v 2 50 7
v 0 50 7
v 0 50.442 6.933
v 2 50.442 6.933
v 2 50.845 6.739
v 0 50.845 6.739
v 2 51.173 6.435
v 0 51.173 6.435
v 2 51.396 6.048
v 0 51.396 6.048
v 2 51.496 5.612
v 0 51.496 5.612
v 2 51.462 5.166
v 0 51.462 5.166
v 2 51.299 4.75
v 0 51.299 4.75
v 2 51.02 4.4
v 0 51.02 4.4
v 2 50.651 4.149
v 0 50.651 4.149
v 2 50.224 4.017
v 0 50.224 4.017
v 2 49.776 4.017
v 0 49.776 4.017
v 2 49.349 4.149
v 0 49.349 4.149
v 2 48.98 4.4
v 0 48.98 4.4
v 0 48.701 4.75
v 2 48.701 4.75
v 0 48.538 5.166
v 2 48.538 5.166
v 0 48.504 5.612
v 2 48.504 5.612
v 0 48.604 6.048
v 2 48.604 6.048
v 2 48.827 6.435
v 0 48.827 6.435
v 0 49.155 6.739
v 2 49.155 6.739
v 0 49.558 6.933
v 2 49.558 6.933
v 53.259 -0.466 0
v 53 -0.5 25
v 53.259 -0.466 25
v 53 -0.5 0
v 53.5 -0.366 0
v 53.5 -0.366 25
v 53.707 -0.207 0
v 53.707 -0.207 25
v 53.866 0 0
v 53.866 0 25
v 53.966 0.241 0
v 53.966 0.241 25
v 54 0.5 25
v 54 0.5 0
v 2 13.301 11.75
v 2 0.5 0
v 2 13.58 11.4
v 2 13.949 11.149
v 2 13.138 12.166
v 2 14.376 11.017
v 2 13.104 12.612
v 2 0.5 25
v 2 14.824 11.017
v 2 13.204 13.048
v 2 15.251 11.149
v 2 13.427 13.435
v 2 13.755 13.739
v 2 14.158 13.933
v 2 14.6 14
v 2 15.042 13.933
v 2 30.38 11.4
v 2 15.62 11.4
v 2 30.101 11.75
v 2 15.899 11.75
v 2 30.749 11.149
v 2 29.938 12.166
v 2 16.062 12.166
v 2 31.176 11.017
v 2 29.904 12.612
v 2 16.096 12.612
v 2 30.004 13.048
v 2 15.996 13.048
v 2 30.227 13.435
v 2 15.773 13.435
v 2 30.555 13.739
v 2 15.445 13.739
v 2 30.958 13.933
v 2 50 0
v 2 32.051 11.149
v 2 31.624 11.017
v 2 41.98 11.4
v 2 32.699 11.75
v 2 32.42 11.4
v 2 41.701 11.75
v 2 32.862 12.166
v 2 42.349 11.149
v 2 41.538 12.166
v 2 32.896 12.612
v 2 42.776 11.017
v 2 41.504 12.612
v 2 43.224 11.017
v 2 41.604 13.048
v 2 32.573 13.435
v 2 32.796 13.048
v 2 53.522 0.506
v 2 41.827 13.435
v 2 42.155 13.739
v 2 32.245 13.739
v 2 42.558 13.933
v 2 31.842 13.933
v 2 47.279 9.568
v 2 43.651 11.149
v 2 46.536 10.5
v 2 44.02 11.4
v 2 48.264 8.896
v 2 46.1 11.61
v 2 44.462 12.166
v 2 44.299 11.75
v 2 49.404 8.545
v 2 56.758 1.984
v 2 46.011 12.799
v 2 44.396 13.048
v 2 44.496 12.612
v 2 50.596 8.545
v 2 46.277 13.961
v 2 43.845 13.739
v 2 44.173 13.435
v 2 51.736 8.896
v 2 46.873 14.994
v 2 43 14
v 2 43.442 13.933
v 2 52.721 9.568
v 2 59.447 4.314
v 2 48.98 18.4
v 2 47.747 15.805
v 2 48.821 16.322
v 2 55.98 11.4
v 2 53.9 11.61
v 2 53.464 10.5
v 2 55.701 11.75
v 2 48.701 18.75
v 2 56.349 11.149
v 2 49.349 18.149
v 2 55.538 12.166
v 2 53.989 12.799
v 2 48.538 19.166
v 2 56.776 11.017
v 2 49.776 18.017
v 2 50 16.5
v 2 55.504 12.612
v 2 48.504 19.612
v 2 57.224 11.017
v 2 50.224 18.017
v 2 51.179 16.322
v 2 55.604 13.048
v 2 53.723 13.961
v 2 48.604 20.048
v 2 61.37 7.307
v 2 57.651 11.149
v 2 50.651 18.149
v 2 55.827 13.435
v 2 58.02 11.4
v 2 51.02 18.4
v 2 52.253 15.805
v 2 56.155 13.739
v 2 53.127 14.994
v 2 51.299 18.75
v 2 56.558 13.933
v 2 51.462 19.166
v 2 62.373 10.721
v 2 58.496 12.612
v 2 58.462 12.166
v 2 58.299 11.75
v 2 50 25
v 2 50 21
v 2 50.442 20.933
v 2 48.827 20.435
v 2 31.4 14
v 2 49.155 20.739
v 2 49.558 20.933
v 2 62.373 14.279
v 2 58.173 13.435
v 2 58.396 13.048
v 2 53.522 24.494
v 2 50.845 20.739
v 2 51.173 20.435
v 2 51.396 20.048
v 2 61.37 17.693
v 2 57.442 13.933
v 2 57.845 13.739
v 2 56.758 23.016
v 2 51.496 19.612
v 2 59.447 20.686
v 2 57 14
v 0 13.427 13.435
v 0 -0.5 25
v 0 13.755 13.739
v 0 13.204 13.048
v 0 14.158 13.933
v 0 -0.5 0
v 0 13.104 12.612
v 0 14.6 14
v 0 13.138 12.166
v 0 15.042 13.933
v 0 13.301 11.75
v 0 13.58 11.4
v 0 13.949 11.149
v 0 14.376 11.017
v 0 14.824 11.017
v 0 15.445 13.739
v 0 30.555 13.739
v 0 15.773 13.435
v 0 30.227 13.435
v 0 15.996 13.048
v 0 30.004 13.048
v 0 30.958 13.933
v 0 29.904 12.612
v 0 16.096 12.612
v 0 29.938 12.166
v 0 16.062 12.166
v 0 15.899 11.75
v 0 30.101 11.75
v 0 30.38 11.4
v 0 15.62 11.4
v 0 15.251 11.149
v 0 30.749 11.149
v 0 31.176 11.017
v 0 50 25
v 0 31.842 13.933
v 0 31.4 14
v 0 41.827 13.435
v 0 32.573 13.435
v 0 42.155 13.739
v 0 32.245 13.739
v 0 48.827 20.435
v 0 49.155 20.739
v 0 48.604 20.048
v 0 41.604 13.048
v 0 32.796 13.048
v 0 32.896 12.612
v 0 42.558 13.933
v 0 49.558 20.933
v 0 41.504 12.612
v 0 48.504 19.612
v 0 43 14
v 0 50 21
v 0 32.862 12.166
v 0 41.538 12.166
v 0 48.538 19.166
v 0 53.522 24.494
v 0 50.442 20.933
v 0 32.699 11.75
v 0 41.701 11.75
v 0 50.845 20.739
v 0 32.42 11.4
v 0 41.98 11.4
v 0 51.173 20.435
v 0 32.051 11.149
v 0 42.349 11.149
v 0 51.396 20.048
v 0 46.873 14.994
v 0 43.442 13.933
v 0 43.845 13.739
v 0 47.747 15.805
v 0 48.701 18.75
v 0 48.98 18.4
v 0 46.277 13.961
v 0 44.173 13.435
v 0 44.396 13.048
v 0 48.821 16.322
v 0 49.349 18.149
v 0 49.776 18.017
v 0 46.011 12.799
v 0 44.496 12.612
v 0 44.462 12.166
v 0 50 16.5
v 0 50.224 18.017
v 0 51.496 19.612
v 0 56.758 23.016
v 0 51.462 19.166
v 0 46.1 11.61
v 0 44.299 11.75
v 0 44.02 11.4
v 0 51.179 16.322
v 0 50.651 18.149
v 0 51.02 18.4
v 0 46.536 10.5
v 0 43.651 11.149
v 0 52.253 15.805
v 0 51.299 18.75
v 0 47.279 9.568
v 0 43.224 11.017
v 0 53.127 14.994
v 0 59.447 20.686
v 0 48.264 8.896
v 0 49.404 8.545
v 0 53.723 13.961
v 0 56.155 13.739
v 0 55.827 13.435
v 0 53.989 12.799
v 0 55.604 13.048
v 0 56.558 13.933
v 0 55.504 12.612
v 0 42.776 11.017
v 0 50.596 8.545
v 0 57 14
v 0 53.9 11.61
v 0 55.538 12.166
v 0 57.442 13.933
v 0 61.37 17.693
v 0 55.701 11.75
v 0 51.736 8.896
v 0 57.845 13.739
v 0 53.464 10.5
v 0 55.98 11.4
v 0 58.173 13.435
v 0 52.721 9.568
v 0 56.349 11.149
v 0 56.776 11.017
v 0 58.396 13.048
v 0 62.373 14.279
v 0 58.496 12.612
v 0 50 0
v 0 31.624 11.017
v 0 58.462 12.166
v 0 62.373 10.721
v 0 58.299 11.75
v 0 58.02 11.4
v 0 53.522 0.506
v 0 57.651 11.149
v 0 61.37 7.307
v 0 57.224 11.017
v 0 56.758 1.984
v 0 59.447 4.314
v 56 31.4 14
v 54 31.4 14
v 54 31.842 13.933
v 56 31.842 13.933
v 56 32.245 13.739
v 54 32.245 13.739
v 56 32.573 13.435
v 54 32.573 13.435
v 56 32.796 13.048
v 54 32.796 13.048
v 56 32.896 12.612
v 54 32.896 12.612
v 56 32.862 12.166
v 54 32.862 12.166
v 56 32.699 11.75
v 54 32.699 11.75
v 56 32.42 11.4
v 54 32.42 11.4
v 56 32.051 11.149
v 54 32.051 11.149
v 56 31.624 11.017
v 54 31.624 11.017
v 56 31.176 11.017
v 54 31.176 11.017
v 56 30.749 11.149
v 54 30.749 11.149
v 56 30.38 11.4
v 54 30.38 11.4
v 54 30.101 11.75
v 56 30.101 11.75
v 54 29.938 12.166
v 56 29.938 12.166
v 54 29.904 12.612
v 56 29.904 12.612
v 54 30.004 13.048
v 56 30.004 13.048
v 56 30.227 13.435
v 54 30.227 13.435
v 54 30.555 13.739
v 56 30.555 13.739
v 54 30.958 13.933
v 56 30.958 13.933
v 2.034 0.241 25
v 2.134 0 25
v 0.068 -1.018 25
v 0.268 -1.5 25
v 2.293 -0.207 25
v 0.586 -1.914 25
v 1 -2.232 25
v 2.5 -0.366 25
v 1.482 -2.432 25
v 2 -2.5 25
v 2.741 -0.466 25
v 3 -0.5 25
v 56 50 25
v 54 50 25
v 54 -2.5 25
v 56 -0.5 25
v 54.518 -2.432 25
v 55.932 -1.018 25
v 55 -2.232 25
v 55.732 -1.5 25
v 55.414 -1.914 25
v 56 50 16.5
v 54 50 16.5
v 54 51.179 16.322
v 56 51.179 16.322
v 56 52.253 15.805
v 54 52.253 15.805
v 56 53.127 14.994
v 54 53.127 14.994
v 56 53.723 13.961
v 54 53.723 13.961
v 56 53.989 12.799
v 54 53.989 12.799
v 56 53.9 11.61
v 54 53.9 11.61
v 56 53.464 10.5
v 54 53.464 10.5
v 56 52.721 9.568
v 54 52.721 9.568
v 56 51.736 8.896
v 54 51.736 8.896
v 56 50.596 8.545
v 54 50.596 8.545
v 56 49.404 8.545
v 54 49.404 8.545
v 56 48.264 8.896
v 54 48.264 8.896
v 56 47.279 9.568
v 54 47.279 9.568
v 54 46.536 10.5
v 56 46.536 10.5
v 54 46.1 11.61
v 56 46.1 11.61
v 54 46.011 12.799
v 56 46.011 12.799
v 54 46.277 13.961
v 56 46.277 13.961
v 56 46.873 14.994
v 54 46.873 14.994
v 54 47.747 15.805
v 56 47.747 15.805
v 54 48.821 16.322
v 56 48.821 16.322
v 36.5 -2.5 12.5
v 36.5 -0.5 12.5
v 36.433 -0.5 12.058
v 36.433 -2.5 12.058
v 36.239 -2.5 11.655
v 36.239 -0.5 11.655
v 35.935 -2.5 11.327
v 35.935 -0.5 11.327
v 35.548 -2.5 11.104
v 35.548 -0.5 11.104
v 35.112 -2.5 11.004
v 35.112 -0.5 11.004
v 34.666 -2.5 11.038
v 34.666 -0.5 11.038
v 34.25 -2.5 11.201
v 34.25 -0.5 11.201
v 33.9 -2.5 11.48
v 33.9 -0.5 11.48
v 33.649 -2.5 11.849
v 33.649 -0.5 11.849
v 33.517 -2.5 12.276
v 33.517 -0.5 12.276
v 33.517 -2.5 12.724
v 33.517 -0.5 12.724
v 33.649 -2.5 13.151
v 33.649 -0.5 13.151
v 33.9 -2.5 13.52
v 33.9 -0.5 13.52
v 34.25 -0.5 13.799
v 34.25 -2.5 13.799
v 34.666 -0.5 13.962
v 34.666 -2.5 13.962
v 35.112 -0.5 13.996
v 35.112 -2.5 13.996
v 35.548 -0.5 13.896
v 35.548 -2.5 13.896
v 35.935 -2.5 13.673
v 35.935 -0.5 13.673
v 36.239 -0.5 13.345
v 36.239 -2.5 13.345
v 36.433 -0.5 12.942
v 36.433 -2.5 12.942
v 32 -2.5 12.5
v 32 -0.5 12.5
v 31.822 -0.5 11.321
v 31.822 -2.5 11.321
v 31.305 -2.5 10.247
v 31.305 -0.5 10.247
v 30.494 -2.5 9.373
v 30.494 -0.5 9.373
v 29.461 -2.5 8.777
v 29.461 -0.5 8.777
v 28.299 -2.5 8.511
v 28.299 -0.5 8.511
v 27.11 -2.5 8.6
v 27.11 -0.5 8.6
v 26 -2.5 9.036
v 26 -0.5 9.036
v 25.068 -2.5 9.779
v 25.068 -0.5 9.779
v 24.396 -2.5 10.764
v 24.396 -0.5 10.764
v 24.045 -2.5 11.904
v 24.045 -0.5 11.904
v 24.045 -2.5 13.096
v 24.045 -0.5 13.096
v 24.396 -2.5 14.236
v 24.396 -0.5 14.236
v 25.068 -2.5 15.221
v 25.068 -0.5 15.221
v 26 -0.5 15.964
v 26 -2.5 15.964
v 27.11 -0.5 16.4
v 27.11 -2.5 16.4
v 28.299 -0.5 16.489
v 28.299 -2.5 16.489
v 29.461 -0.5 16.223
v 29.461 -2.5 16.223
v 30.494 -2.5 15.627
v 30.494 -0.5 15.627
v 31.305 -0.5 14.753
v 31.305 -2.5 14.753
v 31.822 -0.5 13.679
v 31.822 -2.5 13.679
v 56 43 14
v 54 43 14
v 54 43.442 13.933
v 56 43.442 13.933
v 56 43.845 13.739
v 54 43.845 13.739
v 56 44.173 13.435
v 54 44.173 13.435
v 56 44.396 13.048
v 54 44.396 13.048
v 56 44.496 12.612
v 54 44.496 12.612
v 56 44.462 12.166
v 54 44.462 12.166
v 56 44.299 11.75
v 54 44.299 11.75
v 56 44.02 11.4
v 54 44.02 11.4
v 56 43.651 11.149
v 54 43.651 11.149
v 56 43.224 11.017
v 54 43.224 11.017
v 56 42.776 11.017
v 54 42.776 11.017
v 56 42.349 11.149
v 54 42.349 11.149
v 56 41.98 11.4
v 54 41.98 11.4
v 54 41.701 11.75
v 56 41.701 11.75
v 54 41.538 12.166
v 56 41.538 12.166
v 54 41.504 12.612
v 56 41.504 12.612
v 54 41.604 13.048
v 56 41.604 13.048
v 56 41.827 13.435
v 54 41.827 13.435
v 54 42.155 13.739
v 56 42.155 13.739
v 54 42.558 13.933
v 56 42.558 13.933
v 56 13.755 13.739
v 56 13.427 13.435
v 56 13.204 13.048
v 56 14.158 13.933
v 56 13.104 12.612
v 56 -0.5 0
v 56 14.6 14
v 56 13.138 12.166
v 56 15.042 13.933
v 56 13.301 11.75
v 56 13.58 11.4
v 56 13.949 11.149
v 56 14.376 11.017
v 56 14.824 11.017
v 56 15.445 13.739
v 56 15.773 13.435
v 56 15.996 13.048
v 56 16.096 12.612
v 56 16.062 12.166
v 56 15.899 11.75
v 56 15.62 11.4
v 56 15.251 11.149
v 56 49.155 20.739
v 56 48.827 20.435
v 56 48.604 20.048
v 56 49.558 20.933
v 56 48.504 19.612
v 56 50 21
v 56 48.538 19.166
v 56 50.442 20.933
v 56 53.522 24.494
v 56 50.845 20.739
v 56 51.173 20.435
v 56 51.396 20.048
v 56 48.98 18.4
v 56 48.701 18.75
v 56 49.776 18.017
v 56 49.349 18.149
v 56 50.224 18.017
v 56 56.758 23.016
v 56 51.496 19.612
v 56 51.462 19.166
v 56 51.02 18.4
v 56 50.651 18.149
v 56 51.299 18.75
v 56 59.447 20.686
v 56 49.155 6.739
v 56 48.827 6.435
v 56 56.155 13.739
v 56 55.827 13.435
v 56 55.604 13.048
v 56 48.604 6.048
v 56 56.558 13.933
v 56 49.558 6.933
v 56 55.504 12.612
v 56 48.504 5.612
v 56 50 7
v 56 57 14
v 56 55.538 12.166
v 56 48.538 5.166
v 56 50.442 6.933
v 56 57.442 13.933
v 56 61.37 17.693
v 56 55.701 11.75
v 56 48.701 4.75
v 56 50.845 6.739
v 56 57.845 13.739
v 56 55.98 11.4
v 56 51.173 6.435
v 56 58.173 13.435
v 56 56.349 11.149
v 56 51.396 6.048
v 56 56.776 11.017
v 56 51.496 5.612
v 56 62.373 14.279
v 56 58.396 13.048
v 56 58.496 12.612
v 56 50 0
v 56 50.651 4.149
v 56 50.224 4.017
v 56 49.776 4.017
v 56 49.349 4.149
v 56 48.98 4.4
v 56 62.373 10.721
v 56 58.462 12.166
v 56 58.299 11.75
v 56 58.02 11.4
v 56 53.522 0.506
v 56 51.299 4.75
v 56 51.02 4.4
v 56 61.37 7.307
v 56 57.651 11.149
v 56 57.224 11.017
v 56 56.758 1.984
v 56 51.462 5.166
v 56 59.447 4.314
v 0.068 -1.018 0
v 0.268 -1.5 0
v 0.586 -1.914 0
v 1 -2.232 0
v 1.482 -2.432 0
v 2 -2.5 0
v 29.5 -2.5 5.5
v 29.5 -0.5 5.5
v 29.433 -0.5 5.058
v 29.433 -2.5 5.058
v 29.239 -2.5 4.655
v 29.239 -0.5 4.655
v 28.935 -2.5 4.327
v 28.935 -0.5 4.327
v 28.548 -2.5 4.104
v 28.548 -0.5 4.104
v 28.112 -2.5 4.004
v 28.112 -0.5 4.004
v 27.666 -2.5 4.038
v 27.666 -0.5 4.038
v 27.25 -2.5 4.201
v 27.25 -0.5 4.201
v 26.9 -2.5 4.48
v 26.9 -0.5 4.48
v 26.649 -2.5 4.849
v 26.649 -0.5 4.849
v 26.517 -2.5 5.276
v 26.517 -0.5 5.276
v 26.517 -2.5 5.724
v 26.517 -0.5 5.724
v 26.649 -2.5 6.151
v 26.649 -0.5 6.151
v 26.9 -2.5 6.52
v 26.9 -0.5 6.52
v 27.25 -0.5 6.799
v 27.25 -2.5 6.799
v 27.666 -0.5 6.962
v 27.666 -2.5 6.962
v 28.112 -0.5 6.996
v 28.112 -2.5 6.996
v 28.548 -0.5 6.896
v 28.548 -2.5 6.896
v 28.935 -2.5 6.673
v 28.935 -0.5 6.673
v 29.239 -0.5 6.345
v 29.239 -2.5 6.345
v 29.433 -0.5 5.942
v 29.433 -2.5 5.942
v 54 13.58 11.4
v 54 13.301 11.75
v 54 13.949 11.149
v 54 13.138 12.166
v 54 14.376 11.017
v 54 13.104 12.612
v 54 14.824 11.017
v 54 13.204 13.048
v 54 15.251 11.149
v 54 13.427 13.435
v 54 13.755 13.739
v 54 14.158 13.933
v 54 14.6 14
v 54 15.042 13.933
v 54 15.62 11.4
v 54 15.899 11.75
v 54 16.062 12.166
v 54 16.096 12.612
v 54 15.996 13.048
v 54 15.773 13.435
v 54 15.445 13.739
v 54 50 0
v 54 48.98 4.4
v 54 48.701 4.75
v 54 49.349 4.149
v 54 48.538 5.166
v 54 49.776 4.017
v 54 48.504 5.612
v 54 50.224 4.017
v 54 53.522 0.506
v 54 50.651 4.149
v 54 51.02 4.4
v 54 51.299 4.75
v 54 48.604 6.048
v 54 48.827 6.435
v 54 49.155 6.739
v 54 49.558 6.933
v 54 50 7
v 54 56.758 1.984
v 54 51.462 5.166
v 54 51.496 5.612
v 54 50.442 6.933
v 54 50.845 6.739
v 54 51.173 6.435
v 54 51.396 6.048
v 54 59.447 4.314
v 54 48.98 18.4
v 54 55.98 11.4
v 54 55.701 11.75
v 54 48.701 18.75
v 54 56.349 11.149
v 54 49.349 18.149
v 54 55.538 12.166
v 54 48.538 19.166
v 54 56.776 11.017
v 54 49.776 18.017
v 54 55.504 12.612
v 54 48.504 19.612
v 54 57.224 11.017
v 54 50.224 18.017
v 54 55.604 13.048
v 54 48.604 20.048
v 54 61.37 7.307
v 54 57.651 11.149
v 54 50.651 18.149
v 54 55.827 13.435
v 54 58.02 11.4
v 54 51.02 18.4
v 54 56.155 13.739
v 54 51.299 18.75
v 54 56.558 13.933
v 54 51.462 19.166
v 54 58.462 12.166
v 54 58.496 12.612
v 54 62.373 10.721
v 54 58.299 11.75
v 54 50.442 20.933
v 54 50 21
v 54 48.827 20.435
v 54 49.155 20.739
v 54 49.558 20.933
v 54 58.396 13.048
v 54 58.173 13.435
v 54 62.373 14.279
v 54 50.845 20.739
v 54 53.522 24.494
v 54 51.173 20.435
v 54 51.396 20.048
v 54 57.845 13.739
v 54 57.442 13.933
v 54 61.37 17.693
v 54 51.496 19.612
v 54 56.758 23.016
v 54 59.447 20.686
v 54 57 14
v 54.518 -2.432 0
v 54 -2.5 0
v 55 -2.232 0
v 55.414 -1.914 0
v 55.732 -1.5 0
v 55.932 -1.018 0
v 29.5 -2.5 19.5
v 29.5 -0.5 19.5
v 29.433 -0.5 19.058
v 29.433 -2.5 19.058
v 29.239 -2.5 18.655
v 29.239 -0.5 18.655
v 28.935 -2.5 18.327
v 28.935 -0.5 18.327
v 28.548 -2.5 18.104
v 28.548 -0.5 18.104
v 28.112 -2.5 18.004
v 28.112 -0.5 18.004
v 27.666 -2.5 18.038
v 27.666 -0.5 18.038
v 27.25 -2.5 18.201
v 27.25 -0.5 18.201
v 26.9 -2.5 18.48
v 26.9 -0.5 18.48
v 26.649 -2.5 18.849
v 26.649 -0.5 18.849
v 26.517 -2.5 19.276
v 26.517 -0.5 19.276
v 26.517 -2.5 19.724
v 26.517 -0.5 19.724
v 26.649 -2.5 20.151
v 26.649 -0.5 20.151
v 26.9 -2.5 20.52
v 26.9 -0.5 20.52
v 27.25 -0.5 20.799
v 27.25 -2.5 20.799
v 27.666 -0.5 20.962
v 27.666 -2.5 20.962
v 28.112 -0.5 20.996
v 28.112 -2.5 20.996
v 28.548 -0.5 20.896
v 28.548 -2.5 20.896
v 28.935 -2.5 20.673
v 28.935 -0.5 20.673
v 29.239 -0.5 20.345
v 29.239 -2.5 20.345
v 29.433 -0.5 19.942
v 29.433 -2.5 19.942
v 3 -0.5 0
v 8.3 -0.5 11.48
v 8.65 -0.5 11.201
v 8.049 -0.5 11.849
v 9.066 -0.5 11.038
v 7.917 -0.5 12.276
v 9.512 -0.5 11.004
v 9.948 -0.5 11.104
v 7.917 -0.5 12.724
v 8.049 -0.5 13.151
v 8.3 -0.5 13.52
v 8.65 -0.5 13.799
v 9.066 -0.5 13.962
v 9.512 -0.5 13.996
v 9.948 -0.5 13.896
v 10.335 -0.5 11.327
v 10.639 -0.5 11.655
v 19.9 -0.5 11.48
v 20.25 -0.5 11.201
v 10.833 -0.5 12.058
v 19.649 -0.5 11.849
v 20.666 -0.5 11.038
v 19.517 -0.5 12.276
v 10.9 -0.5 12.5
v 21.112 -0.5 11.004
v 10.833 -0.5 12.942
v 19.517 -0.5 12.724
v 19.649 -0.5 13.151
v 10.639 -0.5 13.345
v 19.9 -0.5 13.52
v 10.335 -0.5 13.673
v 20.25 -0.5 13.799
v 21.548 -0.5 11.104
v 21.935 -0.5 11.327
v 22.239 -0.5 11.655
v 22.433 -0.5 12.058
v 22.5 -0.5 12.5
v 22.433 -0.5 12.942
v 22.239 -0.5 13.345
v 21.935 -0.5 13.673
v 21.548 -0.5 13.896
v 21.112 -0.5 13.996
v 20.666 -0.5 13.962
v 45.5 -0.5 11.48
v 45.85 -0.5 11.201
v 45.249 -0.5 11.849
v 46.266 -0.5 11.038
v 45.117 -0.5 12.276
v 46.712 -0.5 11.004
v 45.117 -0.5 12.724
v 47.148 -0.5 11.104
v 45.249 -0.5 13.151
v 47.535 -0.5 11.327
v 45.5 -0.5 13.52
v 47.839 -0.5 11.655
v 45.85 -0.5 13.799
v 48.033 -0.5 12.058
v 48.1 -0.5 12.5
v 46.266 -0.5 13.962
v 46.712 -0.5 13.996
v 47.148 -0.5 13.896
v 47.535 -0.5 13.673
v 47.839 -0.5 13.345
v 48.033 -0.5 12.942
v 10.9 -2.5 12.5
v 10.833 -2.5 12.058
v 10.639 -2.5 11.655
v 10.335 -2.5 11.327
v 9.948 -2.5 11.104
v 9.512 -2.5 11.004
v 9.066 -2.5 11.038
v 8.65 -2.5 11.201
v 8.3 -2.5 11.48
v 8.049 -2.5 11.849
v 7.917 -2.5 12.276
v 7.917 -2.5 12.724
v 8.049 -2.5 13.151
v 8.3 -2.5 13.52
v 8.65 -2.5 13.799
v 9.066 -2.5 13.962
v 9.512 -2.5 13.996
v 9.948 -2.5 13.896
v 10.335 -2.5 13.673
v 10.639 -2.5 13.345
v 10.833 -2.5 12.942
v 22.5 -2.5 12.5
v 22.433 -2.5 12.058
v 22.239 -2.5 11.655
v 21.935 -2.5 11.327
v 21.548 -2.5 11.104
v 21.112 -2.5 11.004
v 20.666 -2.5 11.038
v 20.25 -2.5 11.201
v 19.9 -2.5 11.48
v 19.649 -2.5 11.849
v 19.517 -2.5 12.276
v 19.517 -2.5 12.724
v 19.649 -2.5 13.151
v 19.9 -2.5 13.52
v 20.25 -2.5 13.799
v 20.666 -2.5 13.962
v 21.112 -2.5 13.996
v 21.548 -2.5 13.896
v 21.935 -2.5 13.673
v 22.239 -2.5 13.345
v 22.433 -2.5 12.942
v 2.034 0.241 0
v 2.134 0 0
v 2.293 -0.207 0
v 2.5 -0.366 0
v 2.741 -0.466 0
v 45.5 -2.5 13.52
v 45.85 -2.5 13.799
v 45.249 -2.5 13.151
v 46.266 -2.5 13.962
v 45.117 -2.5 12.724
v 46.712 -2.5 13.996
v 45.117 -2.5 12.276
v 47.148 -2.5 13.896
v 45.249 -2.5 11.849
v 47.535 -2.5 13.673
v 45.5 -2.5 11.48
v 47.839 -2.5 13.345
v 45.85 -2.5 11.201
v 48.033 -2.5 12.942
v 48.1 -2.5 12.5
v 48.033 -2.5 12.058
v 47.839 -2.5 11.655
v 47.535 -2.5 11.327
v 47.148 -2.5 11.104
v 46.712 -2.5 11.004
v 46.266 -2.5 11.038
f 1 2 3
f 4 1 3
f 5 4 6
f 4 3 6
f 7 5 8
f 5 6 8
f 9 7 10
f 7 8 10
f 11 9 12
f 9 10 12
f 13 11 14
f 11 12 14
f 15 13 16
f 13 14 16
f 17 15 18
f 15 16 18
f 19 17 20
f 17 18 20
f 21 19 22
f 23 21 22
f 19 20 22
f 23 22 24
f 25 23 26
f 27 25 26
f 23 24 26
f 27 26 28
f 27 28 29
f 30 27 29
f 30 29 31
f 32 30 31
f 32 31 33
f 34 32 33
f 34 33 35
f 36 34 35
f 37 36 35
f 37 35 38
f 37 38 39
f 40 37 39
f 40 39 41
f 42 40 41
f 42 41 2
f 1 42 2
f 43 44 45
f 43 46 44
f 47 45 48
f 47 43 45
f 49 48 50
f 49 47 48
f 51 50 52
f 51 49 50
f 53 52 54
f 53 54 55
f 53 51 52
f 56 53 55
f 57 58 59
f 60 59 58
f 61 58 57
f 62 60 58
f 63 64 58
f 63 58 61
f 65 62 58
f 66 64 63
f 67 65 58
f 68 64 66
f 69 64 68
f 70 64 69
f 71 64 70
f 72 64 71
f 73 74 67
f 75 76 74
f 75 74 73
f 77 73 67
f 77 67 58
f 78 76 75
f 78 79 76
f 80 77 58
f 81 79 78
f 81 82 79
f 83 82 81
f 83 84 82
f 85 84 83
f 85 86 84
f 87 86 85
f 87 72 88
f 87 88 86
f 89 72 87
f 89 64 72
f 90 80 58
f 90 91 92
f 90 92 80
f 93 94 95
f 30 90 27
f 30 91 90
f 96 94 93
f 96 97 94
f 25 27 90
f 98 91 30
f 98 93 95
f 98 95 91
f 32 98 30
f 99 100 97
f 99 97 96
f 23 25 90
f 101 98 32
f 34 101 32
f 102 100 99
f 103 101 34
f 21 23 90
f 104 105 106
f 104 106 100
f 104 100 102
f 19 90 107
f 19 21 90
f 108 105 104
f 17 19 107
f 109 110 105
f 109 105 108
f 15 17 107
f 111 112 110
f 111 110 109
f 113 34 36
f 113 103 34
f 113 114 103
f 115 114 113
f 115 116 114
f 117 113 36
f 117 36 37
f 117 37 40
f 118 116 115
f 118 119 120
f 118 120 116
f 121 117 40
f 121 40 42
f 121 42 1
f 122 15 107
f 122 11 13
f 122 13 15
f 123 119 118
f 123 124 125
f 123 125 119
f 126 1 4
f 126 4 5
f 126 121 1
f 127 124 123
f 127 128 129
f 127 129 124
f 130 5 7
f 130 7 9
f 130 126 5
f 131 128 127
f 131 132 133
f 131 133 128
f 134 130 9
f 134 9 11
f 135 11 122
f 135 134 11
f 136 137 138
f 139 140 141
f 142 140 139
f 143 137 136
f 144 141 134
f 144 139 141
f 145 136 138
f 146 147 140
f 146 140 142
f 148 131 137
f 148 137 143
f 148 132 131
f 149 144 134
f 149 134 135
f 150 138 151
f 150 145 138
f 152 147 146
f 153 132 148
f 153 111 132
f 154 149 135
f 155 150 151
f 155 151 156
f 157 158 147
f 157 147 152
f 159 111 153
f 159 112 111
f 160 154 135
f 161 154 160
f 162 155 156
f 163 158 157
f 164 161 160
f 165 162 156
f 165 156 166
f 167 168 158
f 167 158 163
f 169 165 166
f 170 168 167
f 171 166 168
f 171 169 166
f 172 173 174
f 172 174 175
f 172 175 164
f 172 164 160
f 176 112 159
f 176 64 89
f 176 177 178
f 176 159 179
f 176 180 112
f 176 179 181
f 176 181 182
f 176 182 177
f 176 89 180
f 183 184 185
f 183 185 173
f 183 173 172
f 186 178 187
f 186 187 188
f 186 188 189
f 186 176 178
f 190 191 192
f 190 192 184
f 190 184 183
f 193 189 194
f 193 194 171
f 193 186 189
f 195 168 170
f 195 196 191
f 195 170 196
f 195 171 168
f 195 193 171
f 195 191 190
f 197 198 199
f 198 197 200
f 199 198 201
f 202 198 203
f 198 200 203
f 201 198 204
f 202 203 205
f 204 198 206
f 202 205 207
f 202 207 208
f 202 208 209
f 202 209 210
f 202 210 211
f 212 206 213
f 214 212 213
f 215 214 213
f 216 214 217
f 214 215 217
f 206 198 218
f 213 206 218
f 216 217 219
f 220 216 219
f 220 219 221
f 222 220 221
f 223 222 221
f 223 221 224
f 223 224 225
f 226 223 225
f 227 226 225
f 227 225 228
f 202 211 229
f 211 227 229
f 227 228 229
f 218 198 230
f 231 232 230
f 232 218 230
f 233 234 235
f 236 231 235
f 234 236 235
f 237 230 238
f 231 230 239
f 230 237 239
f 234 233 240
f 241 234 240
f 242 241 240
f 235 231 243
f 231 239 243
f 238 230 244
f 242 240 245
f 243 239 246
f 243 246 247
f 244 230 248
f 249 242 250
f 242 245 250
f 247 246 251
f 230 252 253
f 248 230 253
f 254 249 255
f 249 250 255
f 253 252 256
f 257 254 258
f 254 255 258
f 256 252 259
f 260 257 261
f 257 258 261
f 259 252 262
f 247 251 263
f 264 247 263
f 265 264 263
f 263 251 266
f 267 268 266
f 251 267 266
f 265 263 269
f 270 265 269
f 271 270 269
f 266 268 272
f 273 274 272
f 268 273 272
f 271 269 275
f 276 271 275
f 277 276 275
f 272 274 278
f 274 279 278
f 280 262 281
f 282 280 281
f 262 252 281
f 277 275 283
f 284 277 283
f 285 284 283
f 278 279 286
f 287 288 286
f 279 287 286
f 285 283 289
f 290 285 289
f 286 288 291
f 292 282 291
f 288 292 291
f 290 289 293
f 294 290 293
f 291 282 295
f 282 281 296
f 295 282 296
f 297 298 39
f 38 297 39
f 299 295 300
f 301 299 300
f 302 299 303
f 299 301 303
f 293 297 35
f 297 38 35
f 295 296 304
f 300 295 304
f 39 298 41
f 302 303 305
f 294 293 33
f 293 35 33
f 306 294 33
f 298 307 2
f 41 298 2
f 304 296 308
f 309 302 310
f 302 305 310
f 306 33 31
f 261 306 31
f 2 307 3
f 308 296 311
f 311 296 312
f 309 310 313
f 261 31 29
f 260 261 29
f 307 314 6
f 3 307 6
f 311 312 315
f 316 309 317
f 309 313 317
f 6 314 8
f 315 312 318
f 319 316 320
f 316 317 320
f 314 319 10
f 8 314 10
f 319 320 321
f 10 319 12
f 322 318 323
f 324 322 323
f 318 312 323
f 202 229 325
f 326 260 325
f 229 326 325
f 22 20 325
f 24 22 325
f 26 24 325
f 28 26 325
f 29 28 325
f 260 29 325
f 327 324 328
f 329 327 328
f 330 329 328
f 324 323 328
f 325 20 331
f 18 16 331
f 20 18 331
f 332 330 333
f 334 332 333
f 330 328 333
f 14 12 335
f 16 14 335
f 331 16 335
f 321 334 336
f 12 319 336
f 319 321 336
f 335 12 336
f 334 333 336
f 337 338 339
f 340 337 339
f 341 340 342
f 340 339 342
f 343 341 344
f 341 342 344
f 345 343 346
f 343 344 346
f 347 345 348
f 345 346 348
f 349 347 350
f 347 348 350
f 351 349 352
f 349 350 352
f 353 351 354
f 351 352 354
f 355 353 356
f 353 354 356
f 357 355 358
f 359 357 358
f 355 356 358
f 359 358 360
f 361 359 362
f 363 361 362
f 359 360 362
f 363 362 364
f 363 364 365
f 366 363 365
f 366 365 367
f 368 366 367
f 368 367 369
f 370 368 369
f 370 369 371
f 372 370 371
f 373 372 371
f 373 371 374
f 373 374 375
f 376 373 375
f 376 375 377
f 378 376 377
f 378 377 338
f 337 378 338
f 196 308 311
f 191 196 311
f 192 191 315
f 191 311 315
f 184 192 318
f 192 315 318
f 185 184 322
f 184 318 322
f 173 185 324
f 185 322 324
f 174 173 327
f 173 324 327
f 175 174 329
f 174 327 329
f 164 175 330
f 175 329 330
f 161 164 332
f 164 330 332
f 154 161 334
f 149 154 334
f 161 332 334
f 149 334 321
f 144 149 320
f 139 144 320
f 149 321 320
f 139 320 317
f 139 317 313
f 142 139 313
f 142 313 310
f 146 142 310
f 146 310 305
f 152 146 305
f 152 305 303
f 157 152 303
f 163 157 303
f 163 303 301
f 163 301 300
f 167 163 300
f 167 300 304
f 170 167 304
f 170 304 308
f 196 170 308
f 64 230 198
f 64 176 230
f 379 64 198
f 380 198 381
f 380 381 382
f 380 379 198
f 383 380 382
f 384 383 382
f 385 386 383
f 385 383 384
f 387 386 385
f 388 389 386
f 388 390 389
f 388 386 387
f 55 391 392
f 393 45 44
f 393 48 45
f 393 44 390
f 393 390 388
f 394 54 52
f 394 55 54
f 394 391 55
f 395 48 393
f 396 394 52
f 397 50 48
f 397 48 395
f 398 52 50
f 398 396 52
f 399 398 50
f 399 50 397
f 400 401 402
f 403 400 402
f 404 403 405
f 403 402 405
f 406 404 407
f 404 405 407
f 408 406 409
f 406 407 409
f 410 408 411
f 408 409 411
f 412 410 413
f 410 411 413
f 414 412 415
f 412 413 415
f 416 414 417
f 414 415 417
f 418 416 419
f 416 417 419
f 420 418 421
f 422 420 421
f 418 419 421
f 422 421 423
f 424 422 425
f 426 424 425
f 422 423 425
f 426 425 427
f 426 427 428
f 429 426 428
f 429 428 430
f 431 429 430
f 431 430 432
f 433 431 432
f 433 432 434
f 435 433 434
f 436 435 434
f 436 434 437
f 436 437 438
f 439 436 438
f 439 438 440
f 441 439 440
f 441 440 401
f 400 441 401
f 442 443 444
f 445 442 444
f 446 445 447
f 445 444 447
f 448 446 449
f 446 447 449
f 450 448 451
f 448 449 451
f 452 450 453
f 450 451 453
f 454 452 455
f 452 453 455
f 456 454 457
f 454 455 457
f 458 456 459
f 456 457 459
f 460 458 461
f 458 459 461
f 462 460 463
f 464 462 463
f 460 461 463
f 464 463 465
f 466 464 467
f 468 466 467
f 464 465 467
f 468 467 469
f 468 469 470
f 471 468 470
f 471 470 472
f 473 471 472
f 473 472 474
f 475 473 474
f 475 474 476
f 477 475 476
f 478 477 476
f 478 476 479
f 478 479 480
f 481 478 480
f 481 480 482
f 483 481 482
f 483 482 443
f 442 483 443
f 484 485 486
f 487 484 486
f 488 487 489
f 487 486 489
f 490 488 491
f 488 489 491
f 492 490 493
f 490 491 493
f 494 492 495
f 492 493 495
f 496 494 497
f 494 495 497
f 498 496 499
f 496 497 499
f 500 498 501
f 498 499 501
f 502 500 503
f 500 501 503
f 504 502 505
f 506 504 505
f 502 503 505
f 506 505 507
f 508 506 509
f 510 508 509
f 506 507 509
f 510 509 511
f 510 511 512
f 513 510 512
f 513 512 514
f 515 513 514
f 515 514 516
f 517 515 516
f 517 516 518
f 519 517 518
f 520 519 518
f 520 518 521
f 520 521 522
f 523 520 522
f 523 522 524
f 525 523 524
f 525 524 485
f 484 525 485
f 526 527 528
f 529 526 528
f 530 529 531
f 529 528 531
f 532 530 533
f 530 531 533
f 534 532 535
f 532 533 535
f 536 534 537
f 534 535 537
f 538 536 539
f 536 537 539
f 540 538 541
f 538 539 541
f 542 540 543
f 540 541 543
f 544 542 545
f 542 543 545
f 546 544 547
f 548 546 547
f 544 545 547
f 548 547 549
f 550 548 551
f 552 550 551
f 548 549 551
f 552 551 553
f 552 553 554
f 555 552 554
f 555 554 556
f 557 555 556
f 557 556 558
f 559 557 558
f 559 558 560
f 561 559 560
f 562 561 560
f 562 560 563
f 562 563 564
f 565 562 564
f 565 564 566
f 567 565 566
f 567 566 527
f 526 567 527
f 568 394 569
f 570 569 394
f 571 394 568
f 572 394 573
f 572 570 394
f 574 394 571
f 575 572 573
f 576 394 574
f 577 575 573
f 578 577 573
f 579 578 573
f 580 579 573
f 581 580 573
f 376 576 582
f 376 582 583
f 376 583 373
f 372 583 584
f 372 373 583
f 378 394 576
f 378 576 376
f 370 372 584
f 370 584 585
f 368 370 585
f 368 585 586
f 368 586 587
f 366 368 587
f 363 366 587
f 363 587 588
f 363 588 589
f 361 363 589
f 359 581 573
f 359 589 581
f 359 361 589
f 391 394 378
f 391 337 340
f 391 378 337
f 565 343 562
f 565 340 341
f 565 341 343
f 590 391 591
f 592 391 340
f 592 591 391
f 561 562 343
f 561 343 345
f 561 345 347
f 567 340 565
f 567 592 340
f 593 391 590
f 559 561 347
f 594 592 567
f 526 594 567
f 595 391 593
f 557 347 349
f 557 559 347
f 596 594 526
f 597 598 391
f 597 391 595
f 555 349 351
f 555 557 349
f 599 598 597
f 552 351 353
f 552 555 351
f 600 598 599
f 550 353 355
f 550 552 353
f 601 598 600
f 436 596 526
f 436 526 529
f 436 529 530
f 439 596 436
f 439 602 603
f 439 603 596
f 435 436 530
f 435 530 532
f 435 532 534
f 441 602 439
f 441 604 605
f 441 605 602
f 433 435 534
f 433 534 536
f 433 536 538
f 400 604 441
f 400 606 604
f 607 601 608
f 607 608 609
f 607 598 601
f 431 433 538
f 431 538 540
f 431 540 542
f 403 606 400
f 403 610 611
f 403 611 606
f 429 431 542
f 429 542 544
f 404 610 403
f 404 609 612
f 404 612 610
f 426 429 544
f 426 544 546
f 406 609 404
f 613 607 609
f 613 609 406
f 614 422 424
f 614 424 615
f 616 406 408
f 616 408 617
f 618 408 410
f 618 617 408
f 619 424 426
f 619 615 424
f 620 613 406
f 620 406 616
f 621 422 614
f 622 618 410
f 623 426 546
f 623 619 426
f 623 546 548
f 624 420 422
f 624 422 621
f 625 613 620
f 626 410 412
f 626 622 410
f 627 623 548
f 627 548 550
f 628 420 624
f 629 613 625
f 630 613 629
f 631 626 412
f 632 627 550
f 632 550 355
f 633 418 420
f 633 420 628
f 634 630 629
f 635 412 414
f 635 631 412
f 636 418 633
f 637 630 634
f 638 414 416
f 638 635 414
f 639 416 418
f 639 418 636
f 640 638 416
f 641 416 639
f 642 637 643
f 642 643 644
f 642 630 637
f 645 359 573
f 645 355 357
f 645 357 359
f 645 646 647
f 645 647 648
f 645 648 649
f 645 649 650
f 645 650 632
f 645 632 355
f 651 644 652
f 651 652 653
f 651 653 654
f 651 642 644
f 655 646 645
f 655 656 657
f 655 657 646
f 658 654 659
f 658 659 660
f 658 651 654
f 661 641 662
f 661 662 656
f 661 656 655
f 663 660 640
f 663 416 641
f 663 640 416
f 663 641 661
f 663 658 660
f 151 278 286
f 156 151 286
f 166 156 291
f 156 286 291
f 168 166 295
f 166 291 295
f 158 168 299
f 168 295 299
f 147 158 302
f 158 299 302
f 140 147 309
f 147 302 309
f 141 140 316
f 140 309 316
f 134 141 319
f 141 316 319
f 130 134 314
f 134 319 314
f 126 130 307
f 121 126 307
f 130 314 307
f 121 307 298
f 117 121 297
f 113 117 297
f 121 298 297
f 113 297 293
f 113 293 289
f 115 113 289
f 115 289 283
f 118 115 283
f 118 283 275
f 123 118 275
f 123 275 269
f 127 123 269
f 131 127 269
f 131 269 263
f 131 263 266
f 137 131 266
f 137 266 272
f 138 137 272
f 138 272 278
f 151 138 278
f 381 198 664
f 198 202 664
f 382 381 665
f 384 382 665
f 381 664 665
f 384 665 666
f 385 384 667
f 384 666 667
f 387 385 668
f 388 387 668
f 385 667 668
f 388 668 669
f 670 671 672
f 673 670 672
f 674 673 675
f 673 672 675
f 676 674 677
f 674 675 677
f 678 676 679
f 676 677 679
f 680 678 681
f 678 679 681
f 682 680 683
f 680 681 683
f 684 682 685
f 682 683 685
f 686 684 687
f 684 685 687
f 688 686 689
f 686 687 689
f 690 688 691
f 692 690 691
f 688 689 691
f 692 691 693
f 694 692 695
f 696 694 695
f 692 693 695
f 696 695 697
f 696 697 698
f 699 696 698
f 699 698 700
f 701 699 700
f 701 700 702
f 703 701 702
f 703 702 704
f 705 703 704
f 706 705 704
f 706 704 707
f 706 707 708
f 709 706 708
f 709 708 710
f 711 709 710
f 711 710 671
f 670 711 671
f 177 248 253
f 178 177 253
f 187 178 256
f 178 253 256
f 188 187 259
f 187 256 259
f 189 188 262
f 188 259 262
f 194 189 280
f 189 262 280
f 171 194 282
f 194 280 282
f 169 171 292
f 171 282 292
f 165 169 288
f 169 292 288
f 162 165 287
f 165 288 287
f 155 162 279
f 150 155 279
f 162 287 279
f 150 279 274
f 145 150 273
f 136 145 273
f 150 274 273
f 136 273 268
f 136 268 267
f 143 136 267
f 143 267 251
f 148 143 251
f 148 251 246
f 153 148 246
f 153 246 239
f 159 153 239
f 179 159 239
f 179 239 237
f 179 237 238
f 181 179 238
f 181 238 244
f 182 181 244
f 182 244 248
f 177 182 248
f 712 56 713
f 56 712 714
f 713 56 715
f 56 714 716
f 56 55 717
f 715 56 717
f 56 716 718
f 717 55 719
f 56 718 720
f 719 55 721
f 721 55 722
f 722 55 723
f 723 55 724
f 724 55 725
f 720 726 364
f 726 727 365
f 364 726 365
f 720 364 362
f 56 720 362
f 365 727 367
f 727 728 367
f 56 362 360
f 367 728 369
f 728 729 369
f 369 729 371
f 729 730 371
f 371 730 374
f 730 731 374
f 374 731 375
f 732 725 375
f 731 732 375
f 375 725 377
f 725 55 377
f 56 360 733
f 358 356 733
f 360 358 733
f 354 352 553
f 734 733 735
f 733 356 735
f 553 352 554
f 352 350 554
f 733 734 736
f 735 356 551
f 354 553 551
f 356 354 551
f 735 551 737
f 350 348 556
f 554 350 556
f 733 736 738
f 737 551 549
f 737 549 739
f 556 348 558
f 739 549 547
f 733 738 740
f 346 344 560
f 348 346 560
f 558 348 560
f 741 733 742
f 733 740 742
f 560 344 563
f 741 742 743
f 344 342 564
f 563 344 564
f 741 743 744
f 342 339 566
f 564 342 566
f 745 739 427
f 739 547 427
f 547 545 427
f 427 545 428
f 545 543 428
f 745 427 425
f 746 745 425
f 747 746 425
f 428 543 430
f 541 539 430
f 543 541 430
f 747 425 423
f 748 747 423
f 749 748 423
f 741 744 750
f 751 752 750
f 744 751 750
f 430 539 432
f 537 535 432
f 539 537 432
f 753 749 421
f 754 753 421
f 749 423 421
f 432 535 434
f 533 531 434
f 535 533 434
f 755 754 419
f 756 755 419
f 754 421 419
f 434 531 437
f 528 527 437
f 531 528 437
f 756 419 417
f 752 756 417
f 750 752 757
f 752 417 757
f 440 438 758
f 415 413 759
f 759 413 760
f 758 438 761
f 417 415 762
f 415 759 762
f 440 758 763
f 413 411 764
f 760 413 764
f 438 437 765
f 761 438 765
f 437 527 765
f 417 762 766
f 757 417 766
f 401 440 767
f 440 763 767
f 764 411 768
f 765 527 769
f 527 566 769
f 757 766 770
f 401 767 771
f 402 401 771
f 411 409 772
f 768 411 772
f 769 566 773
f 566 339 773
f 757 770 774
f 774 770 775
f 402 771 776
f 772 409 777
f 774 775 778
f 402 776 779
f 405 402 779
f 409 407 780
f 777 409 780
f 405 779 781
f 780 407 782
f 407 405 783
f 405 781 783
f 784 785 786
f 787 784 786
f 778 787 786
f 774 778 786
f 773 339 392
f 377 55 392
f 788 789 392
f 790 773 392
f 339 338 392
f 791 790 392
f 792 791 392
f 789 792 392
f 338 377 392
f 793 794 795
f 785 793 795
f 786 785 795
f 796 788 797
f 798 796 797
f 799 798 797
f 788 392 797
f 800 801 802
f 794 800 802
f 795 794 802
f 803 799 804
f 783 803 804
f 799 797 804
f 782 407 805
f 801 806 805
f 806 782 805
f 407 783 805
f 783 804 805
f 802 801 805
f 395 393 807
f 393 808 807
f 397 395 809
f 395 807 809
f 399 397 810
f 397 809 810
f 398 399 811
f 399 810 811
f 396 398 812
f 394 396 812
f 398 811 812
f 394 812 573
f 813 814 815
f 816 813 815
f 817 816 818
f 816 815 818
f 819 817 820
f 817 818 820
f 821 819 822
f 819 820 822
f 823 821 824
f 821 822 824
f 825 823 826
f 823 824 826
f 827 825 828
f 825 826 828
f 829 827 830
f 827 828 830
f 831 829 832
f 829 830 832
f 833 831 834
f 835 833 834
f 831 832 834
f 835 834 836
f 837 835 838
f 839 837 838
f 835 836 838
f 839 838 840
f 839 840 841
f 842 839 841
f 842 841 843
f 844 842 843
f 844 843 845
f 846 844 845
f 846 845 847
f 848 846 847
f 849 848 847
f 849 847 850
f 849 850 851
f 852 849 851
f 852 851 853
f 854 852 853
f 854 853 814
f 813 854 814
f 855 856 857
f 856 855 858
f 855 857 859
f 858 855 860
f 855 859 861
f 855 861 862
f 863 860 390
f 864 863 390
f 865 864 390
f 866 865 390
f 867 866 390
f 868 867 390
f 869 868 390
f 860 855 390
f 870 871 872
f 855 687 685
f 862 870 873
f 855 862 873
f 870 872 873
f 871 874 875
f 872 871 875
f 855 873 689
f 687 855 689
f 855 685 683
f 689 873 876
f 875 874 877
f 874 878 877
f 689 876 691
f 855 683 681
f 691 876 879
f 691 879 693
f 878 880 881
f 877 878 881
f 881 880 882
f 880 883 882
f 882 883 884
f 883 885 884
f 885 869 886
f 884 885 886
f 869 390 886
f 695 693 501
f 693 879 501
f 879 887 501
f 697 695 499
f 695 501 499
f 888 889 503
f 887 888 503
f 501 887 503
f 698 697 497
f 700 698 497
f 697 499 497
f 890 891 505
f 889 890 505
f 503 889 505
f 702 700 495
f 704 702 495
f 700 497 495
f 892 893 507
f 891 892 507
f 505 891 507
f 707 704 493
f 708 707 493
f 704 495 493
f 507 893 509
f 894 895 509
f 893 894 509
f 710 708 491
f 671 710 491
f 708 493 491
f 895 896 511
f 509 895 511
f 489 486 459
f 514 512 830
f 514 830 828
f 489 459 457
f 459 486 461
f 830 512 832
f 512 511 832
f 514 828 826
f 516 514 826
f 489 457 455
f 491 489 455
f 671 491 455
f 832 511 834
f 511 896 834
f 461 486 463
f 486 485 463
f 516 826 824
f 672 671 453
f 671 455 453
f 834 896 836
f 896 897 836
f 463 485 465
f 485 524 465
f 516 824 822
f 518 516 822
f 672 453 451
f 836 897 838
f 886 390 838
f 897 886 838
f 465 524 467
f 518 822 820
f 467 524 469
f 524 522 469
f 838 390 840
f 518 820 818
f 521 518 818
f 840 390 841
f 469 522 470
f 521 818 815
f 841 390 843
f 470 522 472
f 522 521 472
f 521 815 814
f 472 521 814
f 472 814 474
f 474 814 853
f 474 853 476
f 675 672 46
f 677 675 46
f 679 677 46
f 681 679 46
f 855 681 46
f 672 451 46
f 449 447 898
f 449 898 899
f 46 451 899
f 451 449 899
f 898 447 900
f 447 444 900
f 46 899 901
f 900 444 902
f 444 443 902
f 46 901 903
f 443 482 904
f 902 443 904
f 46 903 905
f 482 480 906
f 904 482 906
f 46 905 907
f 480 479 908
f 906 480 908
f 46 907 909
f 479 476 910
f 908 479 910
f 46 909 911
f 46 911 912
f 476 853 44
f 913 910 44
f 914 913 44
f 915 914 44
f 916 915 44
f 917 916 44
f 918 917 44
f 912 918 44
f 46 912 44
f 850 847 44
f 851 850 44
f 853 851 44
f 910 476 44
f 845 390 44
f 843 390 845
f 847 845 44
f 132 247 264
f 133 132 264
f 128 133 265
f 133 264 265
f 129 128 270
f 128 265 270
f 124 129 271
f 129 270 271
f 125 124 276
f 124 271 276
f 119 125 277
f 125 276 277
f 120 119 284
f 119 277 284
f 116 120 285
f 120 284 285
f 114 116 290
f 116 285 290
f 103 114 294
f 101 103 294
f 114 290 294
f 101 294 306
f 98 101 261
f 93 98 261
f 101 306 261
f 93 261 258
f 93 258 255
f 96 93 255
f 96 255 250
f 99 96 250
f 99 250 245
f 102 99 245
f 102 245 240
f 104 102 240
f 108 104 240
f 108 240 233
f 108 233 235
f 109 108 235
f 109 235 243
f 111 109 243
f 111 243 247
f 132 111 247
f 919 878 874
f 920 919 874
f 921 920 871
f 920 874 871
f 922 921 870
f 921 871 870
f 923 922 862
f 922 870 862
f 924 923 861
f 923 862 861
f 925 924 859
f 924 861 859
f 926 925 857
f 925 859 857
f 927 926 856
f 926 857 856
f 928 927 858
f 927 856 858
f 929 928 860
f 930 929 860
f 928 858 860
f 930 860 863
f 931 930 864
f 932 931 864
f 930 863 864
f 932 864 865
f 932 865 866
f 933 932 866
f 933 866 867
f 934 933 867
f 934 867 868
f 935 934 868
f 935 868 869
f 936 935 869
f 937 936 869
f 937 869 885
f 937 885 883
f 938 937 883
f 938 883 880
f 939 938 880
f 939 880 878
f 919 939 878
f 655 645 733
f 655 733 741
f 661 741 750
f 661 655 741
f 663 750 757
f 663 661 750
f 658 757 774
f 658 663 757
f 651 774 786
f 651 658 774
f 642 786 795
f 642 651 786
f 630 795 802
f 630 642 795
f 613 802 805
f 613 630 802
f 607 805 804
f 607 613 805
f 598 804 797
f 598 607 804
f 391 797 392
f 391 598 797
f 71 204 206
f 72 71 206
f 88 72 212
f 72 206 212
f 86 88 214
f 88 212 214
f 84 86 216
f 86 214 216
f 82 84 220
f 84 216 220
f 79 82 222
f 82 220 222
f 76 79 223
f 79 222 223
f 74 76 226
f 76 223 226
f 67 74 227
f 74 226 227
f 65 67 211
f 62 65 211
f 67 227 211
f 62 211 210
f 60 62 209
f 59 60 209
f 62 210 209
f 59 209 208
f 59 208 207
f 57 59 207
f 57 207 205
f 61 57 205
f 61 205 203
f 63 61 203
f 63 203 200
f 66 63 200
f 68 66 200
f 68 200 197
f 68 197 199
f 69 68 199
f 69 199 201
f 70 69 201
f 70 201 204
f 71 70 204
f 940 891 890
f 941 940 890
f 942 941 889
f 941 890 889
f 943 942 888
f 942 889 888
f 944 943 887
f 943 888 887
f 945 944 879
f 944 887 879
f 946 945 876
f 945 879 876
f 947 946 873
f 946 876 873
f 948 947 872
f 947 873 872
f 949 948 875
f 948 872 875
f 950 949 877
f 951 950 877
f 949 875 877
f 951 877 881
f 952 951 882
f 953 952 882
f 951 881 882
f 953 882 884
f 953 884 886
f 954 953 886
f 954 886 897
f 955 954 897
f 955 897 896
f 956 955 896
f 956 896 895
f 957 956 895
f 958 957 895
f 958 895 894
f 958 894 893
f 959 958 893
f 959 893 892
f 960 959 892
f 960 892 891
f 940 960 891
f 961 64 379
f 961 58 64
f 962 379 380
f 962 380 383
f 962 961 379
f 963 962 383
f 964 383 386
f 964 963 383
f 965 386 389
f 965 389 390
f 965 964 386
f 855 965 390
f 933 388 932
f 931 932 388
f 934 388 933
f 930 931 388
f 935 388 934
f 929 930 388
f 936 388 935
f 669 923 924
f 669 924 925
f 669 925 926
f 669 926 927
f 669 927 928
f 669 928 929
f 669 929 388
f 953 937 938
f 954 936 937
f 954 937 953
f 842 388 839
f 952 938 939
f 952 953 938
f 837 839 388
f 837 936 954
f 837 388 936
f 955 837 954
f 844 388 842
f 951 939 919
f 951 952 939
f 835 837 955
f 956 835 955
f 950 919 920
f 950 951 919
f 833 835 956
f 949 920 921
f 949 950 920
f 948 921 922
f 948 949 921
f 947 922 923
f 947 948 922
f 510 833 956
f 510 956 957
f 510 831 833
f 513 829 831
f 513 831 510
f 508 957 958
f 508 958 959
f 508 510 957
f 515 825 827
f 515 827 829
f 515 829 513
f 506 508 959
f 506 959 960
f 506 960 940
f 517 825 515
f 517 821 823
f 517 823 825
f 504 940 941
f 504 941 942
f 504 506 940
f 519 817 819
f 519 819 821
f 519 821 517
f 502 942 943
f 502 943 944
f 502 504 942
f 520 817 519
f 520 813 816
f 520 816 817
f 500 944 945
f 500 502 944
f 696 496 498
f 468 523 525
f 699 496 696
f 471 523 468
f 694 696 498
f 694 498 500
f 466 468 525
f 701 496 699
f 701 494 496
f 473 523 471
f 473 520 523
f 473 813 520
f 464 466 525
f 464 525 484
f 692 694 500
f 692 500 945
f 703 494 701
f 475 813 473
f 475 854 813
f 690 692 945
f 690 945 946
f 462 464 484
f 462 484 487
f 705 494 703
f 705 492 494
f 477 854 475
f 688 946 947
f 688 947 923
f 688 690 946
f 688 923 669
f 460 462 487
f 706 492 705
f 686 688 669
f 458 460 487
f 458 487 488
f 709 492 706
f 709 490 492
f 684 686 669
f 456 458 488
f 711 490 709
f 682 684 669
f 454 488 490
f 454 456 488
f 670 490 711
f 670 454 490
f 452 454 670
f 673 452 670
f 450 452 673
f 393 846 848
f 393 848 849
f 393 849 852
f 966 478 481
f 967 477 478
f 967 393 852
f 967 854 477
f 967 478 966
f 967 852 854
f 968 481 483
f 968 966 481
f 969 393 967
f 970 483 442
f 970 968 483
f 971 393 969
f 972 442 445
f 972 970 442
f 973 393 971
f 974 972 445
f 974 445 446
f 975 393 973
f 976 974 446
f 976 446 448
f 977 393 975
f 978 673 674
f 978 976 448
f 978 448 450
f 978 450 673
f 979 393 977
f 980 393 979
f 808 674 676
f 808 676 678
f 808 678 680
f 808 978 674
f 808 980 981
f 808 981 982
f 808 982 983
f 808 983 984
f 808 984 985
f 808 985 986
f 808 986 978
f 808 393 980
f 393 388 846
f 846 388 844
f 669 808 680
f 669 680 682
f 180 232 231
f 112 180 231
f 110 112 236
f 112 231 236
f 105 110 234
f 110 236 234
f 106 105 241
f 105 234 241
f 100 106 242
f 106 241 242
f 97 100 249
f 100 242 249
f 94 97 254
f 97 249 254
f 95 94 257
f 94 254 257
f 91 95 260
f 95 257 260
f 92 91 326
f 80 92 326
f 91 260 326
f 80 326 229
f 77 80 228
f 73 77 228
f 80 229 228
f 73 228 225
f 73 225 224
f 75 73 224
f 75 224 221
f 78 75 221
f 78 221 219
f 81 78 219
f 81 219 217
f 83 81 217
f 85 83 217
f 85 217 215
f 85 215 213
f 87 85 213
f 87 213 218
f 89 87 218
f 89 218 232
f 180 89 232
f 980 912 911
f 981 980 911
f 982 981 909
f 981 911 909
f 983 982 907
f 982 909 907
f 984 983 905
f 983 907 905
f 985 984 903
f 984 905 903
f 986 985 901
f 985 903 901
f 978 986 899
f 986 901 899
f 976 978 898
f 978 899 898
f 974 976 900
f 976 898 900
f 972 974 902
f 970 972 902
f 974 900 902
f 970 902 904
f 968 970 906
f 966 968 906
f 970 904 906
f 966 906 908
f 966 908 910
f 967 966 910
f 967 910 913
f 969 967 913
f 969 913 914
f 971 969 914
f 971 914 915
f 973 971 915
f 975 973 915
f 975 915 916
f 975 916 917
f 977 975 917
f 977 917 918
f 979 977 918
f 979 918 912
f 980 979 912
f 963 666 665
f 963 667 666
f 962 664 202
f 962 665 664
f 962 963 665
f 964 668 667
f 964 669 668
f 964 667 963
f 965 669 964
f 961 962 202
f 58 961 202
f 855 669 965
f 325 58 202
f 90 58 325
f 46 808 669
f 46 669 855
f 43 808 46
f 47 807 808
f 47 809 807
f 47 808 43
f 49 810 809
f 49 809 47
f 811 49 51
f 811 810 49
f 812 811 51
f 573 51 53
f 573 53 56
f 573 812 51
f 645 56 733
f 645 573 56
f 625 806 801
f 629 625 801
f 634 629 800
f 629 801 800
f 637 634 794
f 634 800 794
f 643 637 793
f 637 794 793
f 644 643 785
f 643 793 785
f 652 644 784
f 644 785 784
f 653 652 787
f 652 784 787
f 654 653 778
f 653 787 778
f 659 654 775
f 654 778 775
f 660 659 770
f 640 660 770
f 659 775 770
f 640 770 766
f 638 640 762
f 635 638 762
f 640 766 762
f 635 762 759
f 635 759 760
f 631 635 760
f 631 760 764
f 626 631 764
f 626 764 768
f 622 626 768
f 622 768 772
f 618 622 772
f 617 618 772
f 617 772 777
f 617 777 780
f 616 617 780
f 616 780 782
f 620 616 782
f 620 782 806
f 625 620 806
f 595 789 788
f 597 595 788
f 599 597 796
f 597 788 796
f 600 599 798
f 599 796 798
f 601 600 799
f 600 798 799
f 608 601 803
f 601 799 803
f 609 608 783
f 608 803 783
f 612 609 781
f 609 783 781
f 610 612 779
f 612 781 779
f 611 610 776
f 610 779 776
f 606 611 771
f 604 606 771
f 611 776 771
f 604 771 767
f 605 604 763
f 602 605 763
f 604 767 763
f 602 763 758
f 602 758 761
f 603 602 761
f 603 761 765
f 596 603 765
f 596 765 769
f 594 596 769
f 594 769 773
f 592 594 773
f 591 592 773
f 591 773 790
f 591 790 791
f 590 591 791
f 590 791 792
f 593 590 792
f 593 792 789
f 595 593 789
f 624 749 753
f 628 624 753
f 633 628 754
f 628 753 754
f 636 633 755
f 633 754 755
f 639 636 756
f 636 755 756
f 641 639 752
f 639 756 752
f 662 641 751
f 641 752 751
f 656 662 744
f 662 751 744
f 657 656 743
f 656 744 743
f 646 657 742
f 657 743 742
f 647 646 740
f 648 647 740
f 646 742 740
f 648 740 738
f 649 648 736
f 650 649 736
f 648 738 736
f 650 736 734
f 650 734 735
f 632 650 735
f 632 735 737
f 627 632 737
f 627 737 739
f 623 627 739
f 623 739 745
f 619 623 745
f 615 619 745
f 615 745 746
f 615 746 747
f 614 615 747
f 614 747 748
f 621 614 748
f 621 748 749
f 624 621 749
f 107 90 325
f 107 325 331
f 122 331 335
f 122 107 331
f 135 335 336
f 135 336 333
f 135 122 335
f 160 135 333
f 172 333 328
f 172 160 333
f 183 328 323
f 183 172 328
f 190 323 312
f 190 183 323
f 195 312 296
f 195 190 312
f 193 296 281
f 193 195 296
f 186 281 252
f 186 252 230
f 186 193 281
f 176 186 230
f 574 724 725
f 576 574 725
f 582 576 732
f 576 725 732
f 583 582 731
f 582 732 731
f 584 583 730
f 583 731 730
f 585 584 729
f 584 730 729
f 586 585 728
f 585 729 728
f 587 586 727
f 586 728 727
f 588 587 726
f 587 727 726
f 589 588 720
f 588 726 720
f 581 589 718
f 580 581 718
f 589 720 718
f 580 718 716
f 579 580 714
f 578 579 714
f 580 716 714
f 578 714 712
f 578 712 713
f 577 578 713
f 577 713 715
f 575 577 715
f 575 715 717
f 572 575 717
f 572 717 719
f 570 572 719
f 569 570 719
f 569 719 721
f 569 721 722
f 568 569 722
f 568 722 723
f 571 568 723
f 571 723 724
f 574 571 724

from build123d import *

# Parameters (mm, degrees)
EXTRUDE_1_DEPTH           = 56
SKETCH_2_W                = 52
SKETCH_2_H                = 100
CUT_EXTRUDE_1_DEPTH       = 88.562834582
HOLE_WIZARD_8_0_8_1_D     = 8
HOLE_WIZARD_8_0_8_1_DEPTH = 2
HOLE_WIZARD_8_0_8_2_D     = 8
HOLE_WIZARD_3_0_3_1_D     = 3
HOLE_WIZARD_3_0_3_1_DEPTH = 2
HOLE_WIZARD_3_0_3_2_D     = 3
HOLE_WIZARD_3_0_3_3_D     = 3
HOLE_WIZARD_8_0_8_3_D     = 8
FILLET_1_R                = 1
FILLET_2_R                = 2


with BuildPart() as part:
    # 草图1 → 凸台-拉伸1 (new body)
    with BuildSketch(Plane(origin=(56, 0, 0), x_dir=(0, 0, -1), z_dir=(1, 0, 0))):
        with BuildLine():
            Line((-25, 50), (-25, -2.5))
            Line((-25, -2.5), (0, -2.5))
            Line((0, -2.5), (0, 50))
            ThreePointArc((0, 50), (-12.5, 62.5), (-25, 50))
        make_face()
    extrude(amount=-EXTRUDE_1_DEPTH)

    # 草图2 → 切除-拉伸1 (cut, through all)
    with BuildSketch(Plane.XY.offset(25)):
        with Locations((28, 49.5)):
            Rectangle(SKETCH_2_W, SKETCH_2_H)
    extrude(amount=-CUT_EXTRUDE_1_DEPTH, mode=Mode.SUBTRACT)

    # Ø8.0 (8) 直径孔1
    with Locations(Plane(origin=(56, 0, 0), x_dir=(0, 0, -1), z_dir=(1, 0, 0))):
        with Locations((-12.5, 50)):
            Hole(HOLE_WIZARD_8_0_8_1_D / 2, depth=HOLE_WIZARD_8_0_8_1_DEPTH)

    # Ø8.0 (8) 直径孔2 (through all)
    with Locations(Plane(origin=(2, 0, 0), x_dir=(0, 0, -1), z_dir=(1, 0, 0))):
        with Locations((-12.5, 50)):
            Hole(HOLE_WIZARD_8_0_8_2_D / 2)

    # Ø3.0 (3) 直径孔1
    with Locations(Plane(origin=(56, 0, 0), x_dir=(0, 0, -1), z_dir=(1, 0, 0))):
        with Locations((-5.5, 50), (-12.5, 57), (-12.5, 31.4), (-12.5, 43), (-19.5, 50), (-12.5, 14.6)):
            Hole(HOLE_WIZARD_3_0_3_1_D / 2, depth=HOLE_WIZARD_3_0_3_1_DEPTH)

    # Ø3.0 (3) 直径孔2 (through all)
    with Locations(Plane(origin=(2, 0, 0), x_dir=(0, 0, -1), z_dir=(1, 0, 0))):
        with Locations((-5.5, 50), (-12.5, 57), (-12.5, 31.4), (-12.5, 43), (-19.5, 50), (-12.5, 14.6)):
            Hole(HOLE_WIZARD_3_0_3_2_D / 2)

    # Ø3.0 (3) 直径孔3 (through all)
    with Locations(Plane(origin=(0, -2.5, 0), x_dir=(-1, 0, 0), z_dir=(0, -1, 0))):
        with Locations((-46.6, -12.5), (-21, -12.5), (-35, -12.5), (-9.4, -12.5), (-28, -19.5), (-28, -5.5)):
            Hole(HOLE_WIZARD_3_0_3_3_D / 2)

    # Ø8.0 (8) 直径孔3 (through all)
    with Locations(Plane(origin=(0, -2.5, 0), x_dir=(-1, 0, 0), z_dir=(0, -1, 0))):
        with Locations((-28, -12.5)):
            Hole(HOLE_WIZARD_8_0_8_3_D / 2)

    # 圆角1
    fillet_1_edges = [part.edges().sort_by_distance(p)[0] for p in [
        (54, -0.5, 12.5),
        (2, -0.5, 12.5),
    ]]
    fillet(fillet_1_edges, radius=FILLET_1_R)

    # 圆角2
    fillet_2_edges = [part.edges().sort_by_distance(p)[0] for p in [
        (0, -2.5, 12.5),
        (56, -2.5, 12.5),
    ]]
    fillet(fillet_2_edges, radius=FILLET_2_R)


solid = part.part
